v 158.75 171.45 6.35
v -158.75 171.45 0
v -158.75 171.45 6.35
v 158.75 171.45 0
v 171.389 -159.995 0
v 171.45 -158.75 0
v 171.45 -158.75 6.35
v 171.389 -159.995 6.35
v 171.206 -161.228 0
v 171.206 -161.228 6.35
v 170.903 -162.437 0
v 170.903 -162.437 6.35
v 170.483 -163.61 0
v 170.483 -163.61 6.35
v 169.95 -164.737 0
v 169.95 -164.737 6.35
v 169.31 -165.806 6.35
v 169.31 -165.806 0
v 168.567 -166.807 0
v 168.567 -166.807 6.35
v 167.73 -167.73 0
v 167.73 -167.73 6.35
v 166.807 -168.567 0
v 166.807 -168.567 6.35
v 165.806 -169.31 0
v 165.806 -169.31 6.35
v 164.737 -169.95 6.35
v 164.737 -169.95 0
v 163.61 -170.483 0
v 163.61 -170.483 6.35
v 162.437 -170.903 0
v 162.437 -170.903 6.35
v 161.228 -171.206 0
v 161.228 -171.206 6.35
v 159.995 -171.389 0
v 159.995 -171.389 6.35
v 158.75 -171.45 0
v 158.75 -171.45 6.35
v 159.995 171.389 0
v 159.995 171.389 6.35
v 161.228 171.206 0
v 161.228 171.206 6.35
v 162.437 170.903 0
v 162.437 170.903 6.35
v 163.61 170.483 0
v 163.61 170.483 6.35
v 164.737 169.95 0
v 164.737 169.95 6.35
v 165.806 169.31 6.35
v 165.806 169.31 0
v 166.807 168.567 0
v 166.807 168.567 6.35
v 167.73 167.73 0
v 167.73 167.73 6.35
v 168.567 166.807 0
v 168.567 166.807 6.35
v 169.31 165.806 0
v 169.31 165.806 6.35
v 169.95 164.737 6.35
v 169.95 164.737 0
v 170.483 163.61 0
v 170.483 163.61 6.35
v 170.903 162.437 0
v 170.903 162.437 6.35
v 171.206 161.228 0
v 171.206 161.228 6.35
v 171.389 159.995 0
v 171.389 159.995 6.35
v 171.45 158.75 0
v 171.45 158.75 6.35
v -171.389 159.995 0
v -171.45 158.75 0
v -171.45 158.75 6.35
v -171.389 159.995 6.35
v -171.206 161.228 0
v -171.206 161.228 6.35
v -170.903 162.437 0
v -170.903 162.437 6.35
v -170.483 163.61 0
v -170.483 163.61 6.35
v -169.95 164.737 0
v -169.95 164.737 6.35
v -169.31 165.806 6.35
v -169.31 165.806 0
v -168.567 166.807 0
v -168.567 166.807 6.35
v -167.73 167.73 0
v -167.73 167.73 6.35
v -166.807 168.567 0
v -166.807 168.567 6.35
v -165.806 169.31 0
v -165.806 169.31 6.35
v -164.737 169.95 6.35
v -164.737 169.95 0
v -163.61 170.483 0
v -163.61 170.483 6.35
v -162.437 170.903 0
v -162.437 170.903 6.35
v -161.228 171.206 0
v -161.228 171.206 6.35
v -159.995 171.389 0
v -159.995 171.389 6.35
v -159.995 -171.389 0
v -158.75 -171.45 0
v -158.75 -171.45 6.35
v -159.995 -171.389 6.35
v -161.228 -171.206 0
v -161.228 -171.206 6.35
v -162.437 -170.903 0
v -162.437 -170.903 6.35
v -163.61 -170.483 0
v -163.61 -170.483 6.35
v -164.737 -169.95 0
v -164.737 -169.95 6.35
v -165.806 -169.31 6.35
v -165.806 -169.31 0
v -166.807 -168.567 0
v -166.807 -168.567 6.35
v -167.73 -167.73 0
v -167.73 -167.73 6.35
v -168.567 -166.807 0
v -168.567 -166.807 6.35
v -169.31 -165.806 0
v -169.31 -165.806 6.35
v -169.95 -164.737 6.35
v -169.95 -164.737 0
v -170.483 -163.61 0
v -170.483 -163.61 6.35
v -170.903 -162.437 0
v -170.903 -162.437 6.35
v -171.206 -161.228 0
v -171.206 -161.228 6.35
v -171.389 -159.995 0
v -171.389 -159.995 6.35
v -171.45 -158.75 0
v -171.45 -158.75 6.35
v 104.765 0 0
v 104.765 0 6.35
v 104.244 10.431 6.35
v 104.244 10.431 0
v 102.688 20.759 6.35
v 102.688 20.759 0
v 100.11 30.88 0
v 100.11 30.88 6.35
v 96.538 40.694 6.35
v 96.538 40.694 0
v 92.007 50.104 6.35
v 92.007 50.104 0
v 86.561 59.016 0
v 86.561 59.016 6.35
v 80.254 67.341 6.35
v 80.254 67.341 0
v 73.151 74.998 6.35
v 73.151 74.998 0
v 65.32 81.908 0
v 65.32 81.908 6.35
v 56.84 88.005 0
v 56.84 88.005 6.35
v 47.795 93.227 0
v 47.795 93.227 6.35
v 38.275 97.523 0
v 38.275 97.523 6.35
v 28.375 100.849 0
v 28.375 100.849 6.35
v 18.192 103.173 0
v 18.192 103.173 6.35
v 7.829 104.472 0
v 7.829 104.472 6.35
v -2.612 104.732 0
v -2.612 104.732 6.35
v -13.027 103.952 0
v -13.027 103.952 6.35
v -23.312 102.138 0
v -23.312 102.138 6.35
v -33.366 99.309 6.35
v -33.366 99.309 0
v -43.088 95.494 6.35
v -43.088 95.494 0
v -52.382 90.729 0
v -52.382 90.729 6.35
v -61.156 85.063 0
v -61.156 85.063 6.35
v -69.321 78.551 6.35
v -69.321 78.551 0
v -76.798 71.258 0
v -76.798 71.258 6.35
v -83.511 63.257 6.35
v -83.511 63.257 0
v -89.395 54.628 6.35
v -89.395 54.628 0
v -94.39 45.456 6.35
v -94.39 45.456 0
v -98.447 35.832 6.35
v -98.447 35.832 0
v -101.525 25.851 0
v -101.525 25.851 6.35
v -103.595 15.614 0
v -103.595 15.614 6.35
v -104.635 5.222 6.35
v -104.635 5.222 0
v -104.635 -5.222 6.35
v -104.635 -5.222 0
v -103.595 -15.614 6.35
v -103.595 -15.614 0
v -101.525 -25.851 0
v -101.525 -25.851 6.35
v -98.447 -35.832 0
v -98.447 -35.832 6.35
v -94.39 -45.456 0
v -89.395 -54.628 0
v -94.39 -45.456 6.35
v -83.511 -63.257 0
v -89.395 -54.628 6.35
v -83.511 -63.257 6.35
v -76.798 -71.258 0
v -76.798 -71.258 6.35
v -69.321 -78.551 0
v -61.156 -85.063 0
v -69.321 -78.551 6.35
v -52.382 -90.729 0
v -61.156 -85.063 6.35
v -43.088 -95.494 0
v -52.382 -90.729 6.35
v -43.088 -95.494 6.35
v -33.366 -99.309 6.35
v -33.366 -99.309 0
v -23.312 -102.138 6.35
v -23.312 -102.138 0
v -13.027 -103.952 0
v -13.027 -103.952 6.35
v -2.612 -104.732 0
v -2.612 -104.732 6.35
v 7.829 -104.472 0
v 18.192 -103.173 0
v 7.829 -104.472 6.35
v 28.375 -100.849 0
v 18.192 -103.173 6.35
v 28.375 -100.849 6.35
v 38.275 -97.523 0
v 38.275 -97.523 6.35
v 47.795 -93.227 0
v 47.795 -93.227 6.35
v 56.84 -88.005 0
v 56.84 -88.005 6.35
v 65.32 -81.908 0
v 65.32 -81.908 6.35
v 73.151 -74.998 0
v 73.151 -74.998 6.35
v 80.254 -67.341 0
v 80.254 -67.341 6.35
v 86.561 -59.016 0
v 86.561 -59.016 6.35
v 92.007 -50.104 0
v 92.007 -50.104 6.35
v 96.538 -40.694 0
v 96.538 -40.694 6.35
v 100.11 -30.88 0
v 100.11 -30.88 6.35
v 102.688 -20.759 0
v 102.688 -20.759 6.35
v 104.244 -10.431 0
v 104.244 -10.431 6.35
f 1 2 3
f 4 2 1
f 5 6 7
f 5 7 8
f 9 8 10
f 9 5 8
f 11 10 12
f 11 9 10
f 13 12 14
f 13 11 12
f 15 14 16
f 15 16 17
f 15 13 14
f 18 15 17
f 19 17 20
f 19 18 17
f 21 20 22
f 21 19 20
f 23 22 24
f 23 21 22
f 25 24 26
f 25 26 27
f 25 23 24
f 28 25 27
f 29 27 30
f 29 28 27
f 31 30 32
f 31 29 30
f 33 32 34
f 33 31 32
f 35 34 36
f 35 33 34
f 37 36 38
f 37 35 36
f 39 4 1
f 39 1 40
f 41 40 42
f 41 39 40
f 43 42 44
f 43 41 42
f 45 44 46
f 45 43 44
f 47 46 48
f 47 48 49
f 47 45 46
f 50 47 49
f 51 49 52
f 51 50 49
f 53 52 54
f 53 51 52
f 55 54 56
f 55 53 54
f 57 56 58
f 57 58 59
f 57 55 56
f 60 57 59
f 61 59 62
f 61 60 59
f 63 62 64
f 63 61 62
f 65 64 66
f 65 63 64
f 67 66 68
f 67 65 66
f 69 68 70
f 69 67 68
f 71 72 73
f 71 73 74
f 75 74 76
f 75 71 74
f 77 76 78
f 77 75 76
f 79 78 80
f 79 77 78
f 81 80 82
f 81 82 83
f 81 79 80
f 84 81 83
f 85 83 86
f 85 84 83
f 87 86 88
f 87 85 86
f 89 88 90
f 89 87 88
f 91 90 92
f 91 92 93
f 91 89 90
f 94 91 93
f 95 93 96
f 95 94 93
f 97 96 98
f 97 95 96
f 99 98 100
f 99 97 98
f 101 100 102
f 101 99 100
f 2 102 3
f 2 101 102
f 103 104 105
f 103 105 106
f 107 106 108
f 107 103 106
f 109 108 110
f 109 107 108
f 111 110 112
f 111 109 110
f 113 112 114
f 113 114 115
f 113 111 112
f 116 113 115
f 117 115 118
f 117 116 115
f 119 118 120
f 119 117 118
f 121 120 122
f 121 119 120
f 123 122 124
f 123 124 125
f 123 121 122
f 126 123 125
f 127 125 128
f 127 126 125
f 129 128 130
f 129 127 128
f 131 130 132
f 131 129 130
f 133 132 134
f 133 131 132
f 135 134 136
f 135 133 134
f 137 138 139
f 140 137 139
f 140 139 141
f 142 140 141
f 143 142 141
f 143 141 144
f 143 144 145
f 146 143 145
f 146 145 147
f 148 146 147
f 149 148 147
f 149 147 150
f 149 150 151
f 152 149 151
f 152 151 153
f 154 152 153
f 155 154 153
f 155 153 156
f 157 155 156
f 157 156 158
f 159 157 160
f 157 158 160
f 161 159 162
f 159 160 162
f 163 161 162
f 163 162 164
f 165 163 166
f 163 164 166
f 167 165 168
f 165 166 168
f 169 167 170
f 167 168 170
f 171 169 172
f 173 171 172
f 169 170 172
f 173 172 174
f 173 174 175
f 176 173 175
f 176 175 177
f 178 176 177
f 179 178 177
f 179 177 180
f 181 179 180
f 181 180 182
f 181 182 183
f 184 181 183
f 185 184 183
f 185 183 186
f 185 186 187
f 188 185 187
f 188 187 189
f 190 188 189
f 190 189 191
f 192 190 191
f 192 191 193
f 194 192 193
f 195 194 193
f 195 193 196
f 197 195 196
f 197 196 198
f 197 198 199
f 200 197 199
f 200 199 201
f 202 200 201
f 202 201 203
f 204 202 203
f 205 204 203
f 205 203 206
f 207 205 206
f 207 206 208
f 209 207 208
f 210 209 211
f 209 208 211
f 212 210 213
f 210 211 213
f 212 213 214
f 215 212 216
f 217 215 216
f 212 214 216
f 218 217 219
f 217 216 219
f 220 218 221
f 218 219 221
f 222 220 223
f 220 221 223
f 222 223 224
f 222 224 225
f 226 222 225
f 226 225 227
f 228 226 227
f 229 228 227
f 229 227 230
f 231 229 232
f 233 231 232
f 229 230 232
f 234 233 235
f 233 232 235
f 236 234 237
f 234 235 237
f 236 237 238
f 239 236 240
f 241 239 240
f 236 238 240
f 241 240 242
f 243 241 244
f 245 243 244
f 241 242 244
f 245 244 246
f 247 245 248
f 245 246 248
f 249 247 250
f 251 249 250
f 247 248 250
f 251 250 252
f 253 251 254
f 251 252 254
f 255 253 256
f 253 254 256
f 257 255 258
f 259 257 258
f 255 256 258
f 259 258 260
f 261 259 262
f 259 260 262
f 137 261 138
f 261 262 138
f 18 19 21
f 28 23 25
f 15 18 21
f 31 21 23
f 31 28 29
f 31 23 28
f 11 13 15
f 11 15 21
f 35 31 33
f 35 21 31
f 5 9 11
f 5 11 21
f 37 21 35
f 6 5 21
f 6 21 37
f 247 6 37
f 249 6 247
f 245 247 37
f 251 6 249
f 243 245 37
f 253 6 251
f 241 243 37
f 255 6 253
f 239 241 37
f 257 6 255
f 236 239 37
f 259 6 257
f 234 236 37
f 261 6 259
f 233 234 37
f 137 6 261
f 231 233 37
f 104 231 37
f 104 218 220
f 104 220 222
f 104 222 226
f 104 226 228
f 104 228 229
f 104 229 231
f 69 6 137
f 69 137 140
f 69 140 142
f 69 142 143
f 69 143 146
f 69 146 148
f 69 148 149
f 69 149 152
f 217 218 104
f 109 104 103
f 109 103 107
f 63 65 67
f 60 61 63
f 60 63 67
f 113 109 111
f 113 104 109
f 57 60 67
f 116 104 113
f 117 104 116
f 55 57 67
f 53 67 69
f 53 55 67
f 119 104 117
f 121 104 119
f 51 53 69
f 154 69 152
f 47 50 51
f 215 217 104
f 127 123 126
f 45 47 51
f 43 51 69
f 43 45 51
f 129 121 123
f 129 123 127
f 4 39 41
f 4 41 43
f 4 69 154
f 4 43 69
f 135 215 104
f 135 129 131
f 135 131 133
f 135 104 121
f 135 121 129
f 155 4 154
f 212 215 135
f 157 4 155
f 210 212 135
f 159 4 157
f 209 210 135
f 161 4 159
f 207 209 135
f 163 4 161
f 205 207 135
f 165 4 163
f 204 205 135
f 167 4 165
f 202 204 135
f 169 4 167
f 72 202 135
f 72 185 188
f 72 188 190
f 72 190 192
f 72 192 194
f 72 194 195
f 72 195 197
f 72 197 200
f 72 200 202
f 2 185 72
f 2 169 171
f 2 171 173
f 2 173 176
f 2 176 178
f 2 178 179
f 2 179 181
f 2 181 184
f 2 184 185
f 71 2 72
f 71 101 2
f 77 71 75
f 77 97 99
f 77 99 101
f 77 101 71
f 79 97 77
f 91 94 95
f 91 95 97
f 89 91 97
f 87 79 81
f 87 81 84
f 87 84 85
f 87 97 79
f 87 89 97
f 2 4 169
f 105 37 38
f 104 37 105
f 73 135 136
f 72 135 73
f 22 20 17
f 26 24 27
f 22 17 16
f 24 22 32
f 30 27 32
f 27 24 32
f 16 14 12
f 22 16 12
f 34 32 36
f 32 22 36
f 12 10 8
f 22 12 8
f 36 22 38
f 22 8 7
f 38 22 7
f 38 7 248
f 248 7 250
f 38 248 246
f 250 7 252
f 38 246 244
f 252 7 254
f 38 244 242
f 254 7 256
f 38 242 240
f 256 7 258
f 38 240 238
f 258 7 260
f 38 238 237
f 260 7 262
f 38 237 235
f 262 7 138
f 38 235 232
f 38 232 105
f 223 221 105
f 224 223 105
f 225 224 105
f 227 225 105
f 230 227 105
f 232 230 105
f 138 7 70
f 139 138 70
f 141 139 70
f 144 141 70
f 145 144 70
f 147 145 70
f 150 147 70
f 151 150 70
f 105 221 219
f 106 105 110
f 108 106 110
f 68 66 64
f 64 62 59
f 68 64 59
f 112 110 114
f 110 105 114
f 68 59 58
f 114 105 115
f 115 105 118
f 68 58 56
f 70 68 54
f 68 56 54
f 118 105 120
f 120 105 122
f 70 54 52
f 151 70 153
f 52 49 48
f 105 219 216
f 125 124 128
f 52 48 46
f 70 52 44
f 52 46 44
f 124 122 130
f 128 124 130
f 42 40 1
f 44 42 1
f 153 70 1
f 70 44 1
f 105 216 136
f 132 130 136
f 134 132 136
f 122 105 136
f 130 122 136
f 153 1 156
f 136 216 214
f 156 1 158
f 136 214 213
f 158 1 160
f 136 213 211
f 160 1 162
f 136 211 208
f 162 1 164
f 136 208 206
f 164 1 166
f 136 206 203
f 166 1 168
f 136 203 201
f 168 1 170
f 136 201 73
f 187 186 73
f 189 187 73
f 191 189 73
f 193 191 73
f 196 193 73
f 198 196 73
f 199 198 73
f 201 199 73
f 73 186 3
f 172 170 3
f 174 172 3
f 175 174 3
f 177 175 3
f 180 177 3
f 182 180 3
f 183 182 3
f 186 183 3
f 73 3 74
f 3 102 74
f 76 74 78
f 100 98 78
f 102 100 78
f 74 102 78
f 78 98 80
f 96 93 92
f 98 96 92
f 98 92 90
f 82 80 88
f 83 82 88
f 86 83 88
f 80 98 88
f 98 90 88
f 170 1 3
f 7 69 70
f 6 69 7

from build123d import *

# Parameters (mm, degrees)
BOSS_EXTRUDE1_DEPTH = 6.35
SKETCH2_R           = 104.764774547
CUT_EXTRUDE1_DEPTH  = 243.550051536


with BuildPart() as part:
    # Sketch1 → Boss-Extrude1 (new body)
    with BuildSketch(Plane.XY):
        with BuildLine():
            Line((-158.75, 171.45), (158.75, 171.45))
            ThreePointArc((158.75, 171.45), (167.730256121, 167.730256121), (171.45, 158.75))
            Line((171.45, 158.75), (171.45, -158.75))
            ThreePointArc((171.45, -158.75), (167.730256121, -167.730256121), (158.75, -171.45))
            Line((158.75, -171.45), (-158.75, -171.45))
            ThreePointArc((-158.75, -171.45), (-167.730256121, -167.730256121), (-171.45, -158.75))
            Line((-171.45, -158.75), (-171.45, 158.75))
            ThreePointArc((-171.45, 158.75), (-167.730256121, 167.730256121), (-158.75, 171.45))
        make_face()
    extrude(amount=BOSS_EXTRUDE1_DEPTH)

    # Sketch2 → Cut-Extrude1 (cut, through all)
    with BuildSketch(Plane.XY.offset(6.35)):
        Circle(SKETCH2_R)
    extrude(amount=-CUT_EXTRUDE1_DEPTH, mode=Mode.SUBTRACT)


solid = part.part
